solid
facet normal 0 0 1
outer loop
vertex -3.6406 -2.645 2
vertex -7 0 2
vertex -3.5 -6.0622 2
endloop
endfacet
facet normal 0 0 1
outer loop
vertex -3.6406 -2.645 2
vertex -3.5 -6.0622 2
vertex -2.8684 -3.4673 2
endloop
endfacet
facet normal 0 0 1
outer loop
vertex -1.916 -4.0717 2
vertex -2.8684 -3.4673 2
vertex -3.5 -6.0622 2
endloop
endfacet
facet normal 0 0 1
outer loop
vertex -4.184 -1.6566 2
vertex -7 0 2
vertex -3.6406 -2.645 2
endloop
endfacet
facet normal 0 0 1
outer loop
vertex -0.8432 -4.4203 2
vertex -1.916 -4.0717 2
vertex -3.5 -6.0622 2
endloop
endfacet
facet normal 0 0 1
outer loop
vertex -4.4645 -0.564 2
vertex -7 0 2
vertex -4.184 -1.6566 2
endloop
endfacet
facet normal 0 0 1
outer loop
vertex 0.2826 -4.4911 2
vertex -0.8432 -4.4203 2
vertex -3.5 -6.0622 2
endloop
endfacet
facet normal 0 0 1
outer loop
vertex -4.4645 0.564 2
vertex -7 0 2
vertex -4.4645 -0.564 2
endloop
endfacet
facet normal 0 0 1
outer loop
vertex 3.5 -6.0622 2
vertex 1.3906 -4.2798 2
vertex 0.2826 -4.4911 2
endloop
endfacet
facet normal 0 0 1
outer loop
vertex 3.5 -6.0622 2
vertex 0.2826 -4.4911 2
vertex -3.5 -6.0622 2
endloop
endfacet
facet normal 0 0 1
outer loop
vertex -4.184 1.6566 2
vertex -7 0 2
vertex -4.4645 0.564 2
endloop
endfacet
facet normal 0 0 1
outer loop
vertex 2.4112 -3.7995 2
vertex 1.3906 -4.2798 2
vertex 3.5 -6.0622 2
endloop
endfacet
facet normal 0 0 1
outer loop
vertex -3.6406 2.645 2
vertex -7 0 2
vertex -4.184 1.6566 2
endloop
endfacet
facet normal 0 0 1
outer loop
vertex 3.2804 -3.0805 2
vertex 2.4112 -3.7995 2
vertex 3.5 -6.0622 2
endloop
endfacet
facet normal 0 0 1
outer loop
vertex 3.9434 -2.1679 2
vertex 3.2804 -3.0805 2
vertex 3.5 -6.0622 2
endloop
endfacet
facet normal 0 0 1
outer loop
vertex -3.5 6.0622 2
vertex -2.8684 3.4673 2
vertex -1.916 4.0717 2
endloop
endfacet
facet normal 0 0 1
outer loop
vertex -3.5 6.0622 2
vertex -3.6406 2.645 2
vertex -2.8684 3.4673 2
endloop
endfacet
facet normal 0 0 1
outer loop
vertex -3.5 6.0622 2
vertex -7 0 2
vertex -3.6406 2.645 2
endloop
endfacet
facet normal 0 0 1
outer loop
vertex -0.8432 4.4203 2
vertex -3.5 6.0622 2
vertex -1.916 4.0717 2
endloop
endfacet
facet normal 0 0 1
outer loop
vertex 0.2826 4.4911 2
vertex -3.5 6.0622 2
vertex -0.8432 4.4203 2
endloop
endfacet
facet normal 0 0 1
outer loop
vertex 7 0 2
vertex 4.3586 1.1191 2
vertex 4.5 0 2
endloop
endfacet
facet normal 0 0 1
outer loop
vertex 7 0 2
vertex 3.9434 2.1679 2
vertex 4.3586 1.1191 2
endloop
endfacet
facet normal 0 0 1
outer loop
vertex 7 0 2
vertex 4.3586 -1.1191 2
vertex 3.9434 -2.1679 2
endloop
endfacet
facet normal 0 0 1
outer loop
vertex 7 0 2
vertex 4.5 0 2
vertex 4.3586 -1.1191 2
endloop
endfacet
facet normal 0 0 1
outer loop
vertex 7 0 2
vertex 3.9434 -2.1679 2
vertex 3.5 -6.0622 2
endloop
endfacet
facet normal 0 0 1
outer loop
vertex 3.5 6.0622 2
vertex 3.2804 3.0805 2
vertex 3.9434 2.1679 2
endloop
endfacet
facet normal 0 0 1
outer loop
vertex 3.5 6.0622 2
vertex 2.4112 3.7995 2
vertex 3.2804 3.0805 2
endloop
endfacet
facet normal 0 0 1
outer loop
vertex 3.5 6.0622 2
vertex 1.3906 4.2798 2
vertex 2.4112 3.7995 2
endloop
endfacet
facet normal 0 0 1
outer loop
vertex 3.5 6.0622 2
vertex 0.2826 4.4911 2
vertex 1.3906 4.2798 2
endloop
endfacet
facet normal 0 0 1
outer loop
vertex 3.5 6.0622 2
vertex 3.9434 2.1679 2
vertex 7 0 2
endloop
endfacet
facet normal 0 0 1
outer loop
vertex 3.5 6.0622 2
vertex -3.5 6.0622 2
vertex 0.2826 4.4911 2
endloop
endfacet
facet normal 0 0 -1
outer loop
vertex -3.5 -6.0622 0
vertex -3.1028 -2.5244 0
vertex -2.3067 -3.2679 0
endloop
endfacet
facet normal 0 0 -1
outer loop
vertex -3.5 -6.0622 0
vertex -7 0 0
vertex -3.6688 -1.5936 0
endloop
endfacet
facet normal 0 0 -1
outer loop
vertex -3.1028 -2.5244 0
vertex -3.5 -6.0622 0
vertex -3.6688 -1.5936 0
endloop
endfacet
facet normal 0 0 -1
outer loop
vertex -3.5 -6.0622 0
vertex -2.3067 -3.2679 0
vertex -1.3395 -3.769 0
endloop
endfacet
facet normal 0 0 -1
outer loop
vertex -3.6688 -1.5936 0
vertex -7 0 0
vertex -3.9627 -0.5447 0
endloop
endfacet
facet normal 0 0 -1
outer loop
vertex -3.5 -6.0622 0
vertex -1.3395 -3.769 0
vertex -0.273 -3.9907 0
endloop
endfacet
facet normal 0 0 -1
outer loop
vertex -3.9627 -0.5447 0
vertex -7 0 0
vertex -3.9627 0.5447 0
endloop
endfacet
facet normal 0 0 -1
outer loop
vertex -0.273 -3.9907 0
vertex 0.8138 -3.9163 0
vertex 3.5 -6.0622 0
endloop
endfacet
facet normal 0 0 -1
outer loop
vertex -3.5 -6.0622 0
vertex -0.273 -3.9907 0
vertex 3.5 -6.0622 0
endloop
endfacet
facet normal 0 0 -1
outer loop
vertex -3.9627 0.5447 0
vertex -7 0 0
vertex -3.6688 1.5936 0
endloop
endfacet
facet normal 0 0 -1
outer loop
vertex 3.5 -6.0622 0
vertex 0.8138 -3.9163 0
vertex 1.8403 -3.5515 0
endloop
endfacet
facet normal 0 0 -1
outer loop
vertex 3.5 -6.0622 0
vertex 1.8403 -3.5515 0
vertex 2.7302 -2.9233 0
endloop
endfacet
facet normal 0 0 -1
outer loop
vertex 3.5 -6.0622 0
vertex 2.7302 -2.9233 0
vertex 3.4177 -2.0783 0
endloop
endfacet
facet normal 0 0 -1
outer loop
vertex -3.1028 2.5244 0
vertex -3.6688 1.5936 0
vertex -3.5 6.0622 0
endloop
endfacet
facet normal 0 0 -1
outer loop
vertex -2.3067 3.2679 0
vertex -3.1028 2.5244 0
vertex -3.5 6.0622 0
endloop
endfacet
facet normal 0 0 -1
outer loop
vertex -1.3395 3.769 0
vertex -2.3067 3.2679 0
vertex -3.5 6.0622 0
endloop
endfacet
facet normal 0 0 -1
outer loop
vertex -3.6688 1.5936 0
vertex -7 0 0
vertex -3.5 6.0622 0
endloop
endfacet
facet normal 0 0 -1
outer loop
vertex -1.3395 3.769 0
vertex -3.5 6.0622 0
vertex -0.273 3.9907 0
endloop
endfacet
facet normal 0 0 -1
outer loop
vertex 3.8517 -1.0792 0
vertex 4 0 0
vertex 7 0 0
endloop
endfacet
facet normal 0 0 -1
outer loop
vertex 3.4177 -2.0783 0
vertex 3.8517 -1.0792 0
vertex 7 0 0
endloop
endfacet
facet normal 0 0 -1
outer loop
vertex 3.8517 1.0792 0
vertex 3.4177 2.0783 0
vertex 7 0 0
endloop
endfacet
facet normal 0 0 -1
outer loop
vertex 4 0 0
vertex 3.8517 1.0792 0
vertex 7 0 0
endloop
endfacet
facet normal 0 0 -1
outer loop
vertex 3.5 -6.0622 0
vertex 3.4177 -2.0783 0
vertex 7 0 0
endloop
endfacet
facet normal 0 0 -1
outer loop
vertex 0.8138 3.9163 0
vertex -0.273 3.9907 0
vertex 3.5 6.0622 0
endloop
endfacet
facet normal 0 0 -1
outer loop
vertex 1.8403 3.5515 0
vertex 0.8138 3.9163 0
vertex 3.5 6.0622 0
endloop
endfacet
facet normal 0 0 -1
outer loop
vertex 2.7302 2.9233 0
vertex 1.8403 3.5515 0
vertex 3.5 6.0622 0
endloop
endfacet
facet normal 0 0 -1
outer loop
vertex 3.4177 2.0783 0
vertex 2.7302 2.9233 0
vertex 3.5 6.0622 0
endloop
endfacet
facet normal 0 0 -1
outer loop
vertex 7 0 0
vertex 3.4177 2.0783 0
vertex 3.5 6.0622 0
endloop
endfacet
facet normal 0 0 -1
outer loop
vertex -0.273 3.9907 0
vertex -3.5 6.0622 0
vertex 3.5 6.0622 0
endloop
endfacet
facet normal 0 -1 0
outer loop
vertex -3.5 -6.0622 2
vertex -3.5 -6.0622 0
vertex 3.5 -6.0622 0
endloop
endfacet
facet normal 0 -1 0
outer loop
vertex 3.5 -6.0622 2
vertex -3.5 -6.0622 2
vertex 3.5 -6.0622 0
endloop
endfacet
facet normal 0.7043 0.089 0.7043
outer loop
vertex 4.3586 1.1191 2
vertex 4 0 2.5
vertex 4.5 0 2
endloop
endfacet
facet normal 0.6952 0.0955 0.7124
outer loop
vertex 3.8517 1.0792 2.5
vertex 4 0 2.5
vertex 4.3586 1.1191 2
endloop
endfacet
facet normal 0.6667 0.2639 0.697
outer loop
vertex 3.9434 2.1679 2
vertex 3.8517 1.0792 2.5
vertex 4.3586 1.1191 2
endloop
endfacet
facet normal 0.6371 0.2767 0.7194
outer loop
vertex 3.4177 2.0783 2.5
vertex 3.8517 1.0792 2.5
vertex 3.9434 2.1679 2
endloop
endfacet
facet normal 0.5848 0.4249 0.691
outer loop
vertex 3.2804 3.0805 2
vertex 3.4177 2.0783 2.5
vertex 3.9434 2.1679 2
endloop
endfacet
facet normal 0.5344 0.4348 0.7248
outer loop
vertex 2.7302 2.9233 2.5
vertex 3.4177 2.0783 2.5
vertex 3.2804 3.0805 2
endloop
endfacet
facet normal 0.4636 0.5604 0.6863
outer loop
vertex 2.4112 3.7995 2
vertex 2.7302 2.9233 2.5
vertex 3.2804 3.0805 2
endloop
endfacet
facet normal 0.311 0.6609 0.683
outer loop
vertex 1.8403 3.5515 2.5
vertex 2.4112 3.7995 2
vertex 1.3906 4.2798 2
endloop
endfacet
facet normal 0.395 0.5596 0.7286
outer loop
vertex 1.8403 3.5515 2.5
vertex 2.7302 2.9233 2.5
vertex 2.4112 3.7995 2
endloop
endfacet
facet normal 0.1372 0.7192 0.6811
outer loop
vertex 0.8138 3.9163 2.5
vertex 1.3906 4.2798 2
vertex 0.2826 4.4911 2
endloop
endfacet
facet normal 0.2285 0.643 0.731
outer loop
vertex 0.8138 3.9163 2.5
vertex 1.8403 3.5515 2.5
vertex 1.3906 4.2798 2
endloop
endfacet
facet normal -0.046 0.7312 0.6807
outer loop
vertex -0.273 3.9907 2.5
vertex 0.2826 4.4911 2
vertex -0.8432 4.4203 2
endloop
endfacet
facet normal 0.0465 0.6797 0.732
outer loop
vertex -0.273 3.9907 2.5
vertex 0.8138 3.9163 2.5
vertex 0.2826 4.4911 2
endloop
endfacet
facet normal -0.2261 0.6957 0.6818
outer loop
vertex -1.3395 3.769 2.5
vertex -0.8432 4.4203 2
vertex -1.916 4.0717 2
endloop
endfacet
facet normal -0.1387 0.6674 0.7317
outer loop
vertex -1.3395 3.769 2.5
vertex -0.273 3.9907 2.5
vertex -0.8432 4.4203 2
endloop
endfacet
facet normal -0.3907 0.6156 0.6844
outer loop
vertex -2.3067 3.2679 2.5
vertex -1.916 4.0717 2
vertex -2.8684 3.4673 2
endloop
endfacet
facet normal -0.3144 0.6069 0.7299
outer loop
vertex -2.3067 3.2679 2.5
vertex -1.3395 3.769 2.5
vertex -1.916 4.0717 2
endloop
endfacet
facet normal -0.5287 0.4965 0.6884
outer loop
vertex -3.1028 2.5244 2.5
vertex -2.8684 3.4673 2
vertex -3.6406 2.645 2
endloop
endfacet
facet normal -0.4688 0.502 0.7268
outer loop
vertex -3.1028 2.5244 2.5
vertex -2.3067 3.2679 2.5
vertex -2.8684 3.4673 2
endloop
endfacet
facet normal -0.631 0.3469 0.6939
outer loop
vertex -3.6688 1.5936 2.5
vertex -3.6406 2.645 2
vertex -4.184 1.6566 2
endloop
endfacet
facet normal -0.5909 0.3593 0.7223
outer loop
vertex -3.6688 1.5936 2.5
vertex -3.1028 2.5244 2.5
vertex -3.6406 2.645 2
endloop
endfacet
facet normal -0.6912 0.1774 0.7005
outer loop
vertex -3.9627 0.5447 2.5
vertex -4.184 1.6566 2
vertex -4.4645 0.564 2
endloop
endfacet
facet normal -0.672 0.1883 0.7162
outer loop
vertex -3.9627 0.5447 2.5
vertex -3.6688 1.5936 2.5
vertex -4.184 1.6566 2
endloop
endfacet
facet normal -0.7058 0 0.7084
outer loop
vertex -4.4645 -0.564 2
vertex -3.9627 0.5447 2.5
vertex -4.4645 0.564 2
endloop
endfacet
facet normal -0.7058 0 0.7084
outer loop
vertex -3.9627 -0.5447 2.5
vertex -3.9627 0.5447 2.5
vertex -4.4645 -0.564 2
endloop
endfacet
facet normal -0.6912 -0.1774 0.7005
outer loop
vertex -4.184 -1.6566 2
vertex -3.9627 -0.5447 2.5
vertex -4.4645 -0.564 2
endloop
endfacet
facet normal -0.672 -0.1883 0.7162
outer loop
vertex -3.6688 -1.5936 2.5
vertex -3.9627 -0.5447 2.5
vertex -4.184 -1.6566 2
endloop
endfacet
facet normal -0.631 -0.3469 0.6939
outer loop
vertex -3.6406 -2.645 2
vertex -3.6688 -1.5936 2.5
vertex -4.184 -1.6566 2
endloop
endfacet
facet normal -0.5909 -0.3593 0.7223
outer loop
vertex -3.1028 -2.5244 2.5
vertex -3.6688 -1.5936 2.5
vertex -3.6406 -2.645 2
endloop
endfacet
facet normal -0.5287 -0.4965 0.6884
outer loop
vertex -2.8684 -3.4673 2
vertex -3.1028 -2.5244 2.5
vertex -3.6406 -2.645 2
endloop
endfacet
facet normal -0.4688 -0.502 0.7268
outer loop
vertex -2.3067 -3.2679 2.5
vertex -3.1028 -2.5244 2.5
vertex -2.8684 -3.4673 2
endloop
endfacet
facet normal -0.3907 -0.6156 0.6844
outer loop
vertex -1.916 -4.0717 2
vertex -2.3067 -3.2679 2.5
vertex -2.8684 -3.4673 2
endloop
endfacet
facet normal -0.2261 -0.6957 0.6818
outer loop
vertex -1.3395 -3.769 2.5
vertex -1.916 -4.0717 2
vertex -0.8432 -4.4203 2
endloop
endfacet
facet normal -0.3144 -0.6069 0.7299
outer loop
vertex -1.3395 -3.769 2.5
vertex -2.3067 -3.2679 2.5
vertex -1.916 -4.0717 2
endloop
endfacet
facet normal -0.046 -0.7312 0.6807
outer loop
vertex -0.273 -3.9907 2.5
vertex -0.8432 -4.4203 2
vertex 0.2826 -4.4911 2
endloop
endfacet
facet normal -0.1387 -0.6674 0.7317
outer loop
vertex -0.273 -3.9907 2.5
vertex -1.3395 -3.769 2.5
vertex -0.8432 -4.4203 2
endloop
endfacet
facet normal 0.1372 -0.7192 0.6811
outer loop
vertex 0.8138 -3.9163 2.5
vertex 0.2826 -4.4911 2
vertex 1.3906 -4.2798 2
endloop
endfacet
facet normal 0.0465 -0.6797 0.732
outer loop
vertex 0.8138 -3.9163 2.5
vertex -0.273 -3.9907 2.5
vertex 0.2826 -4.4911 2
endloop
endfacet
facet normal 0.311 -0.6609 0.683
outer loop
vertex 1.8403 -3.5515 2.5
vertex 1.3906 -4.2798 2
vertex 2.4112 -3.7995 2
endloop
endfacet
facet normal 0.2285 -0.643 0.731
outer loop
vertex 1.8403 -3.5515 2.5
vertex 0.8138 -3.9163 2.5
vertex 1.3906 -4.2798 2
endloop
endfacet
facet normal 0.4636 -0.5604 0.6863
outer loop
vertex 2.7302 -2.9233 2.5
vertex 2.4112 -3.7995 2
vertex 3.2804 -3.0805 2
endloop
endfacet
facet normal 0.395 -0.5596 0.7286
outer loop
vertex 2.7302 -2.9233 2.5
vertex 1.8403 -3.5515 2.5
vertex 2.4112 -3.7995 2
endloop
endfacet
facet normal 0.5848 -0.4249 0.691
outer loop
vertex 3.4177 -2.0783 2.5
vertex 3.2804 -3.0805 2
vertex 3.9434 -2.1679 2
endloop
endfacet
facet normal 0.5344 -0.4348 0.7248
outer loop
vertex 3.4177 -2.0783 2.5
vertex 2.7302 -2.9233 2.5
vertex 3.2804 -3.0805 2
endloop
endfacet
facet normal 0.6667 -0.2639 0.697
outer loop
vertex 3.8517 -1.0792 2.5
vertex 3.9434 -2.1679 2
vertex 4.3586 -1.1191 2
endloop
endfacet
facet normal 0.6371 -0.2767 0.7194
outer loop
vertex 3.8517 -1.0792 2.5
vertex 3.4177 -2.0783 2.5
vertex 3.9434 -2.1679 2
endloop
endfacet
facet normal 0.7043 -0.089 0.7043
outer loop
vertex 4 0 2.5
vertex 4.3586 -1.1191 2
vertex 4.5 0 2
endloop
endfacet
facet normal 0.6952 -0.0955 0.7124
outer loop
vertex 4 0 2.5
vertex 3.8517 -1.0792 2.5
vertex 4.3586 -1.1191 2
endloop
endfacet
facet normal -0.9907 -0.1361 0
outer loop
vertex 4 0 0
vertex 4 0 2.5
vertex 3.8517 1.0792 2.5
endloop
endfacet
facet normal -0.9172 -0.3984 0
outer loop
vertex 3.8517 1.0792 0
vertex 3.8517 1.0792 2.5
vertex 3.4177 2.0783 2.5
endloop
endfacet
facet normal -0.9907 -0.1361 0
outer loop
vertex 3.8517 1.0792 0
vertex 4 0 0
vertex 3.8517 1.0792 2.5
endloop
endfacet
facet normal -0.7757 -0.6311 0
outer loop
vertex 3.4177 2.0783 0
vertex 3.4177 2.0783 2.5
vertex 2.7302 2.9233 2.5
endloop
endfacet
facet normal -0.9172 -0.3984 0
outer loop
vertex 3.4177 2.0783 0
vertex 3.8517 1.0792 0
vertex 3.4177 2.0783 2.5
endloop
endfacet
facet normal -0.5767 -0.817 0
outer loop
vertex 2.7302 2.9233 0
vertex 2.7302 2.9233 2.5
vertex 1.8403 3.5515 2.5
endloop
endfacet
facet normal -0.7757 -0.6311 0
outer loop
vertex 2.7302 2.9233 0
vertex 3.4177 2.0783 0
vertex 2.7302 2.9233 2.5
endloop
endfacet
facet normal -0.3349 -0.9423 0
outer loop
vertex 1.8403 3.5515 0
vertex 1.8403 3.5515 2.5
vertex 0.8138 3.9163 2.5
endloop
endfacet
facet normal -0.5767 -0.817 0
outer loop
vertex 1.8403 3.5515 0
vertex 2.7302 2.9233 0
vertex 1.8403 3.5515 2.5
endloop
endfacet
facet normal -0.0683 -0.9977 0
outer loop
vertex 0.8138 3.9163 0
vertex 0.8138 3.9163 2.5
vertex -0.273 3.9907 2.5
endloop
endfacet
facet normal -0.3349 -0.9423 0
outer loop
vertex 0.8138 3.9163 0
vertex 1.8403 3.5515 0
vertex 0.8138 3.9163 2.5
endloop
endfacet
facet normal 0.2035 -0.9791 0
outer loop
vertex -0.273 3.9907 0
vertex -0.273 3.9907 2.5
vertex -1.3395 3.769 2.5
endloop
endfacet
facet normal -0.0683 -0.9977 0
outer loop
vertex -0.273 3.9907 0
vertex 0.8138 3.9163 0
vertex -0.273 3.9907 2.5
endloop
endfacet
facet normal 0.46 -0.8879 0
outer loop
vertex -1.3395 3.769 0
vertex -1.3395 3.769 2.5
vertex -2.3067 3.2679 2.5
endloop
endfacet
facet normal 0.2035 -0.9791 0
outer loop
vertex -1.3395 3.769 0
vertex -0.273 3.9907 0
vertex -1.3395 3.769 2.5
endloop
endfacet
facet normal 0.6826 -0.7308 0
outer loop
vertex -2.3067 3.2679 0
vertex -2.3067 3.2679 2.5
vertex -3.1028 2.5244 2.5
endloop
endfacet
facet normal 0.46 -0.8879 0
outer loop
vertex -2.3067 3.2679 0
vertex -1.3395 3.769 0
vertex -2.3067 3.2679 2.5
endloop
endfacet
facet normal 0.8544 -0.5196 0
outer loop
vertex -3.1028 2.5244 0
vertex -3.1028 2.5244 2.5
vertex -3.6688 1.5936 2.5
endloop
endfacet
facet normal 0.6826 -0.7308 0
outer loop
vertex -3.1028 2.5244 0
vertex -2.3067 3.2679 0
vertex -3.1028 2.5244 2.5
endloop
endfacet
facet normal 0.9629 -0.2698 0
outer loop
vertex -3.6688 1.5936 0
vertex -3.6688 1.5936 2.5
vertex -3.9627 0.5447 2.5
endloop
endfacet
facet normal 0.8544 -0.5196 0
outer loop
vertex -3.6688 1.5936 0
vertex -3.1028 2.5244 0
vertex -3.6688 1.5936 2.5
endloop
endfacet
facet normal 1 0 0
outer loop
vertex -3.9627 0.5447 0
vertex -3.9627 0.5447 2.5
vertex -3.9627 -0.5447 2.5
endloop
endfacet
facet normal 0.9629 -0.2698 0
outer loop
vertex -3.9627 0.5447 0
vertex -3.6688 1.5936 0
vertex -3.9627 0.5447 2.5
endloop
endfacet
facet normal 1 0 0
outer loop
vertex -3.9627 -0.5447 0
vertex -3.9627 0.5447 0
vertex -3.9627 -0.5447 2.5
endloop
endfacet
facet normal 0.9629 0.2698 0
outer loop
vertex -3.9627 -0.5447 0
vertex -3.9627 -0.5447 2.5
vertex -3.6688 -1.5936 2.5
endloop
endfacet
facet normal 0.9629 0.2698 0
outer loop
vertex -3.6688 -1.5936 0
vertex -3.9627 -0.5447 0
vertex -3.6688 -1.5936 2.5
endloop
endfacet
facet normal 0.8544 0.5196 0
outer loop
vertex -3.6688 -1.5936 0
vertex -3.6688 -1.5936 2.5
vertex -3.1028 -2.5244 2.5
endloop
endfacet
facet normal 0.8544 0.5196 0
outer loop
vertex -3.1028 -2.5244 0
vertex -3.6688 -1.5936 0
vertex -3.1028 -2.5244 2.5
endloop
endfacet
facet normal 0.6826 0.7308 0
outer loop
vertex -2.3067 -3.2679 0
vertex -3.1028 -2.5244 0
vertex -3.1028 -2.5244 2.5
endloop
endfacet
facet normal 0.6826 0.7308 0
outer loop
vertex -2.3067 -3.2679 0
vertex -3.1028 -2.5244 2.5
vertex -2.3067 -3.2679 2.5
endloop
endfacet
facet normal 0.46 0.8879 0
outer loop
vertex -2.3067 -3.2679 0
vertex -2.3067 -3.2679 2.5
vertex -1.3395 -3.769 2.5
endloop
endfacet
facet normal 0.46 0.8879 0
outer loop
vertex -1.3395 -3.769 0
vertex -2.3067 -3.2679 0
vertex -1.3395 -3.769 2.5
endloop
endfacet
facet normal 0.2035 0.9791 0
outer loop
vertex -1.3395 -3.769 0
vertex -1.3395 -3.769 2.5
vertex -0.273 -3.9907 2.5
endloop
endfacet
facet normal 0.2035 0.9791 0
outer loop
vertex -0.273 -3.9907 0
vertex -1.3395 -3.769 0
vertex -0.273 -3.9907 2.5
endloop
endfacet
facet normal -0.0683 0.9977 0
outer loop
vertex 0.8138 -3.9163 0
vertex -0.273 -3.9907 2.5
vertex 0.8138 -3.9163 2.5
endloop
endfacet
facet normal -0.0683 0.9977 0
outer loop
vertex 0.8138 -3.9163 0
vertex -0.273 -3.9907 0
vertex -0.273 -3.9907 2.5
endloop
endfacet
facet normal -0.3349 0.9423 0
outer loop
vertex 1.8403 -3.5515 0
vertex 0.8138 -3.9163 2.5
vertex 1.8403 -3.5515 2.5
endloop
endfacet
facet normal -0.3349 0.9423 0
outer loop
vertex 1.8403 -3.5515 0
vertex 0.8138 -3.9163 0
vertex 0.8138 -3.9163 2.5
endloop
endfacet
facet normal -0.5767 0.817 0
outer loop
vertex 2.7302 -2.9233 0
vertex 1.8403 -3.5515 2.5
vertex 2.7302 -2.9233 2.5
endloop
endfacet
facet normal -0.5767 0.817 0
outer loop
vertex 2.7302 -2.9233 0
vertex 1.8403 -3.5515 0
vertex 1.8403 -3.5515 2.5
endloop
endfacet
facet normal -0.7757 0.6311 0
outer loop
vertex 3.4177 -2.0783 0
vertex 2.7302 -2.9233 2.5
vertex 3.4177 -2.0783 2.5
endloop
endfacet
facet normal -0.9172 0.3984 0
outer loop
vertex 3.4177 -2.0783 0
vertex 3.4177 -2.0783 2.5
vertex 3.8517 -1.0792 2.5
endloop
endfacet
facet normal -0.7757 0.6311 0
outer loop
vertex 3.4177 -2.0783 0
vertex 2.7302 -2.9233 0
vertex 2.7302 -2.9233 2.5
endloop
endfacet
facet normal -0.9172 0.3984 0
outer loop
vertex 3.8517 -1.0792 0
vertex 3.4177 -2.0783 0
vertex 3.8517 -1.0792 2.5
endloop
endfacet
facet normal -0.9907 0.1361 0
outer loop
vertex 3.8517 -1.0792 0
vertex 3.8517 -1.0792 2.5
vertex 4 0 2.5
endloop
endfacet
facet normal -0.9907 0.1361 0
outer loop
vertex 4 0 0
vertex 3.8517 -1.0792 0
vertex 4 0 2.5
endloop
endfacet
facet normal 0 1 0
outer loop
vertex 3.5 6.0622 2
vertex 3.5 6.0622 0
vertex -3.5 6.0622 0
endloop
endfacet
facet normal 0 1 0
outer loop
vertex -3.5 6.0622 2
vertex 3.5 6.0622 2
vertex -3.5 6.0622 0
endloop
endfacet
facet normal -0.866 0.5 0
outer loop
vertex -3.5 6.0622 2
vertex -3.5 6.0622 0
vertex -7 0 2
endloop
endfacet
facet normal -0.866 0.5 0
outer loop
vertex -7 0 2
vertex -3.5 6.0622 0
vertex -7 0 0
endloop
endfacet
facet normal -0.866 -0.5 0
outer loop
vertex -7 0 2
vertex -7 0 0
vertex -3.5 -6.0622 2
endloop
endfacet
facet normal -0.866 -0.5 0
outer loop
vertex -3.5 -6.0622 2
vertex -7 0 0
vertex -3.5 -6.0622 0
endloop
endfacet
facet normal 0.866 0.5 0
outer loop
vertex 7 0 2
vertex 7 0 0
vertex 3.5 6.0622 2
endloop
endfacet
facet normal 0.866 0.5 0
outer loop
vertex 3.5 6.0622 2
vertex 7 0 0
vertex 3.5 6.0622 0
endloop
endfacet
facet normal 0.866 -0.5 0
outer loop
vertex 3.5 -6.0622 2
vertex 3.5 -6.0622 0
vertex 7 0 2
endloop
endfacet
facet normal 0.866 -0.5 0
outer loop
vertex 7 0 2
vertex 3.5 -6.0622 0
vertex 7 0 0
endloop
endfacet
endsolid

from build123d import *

# Parameters (mm, degrees)
CYLINDER003_R     = 4
CYLINDER003_DEPTH = 10
PRISM_DEPTH       = 2
CYLINDER002_R     = 5
CYLINDER002_DEPTH = 1.5
CHAMFER002_SIZE   = 1


with BuildPart() as cylinder003:
    # Cylinder003 → Cylinder003 (new body)
    with BuildSketch(Plane.XY.offset(-1)):
        Circle(CYLINDER003_R)
    extrude(amount=CYLINDER003_DEPTH)


with BuildPart() as prism:
    # Prism → Prism (new body)
    with BuildSketch(Plane.XY):
        Polygon((7, 0), (3.5, 6.062178), (-3.5, 6.062178), (-7, 0), (-3.5, -6.062178), (3.5, -6.062178), align=None)
    extrude(amount=PRISM_DEPTH)


with BuildPart() as cut003:
    # Cylinder002 → Cylinder002 (new body)
    with BuildSketch(Plane.XY.offset(1)):
        Circle(CYLINDER002_R)
    extrude(amount=CYLINDER002_DEPTH)

    # Chamfer002
    chamfer002_edges = [cut003.edges().sort_by_distance(p)[0] for p in [
        (-5, 0, 2.5),
    ]]
    chamfer(chamfer002_edges, length=CHAMFER002_SIZE)

    # Fusion006: union Prism
    add(prism.part)

    # Cut003: cut Cylinder003
    add(cylinder003.part, mode=Mode.SUBTRACT)


solid = cut003.part
